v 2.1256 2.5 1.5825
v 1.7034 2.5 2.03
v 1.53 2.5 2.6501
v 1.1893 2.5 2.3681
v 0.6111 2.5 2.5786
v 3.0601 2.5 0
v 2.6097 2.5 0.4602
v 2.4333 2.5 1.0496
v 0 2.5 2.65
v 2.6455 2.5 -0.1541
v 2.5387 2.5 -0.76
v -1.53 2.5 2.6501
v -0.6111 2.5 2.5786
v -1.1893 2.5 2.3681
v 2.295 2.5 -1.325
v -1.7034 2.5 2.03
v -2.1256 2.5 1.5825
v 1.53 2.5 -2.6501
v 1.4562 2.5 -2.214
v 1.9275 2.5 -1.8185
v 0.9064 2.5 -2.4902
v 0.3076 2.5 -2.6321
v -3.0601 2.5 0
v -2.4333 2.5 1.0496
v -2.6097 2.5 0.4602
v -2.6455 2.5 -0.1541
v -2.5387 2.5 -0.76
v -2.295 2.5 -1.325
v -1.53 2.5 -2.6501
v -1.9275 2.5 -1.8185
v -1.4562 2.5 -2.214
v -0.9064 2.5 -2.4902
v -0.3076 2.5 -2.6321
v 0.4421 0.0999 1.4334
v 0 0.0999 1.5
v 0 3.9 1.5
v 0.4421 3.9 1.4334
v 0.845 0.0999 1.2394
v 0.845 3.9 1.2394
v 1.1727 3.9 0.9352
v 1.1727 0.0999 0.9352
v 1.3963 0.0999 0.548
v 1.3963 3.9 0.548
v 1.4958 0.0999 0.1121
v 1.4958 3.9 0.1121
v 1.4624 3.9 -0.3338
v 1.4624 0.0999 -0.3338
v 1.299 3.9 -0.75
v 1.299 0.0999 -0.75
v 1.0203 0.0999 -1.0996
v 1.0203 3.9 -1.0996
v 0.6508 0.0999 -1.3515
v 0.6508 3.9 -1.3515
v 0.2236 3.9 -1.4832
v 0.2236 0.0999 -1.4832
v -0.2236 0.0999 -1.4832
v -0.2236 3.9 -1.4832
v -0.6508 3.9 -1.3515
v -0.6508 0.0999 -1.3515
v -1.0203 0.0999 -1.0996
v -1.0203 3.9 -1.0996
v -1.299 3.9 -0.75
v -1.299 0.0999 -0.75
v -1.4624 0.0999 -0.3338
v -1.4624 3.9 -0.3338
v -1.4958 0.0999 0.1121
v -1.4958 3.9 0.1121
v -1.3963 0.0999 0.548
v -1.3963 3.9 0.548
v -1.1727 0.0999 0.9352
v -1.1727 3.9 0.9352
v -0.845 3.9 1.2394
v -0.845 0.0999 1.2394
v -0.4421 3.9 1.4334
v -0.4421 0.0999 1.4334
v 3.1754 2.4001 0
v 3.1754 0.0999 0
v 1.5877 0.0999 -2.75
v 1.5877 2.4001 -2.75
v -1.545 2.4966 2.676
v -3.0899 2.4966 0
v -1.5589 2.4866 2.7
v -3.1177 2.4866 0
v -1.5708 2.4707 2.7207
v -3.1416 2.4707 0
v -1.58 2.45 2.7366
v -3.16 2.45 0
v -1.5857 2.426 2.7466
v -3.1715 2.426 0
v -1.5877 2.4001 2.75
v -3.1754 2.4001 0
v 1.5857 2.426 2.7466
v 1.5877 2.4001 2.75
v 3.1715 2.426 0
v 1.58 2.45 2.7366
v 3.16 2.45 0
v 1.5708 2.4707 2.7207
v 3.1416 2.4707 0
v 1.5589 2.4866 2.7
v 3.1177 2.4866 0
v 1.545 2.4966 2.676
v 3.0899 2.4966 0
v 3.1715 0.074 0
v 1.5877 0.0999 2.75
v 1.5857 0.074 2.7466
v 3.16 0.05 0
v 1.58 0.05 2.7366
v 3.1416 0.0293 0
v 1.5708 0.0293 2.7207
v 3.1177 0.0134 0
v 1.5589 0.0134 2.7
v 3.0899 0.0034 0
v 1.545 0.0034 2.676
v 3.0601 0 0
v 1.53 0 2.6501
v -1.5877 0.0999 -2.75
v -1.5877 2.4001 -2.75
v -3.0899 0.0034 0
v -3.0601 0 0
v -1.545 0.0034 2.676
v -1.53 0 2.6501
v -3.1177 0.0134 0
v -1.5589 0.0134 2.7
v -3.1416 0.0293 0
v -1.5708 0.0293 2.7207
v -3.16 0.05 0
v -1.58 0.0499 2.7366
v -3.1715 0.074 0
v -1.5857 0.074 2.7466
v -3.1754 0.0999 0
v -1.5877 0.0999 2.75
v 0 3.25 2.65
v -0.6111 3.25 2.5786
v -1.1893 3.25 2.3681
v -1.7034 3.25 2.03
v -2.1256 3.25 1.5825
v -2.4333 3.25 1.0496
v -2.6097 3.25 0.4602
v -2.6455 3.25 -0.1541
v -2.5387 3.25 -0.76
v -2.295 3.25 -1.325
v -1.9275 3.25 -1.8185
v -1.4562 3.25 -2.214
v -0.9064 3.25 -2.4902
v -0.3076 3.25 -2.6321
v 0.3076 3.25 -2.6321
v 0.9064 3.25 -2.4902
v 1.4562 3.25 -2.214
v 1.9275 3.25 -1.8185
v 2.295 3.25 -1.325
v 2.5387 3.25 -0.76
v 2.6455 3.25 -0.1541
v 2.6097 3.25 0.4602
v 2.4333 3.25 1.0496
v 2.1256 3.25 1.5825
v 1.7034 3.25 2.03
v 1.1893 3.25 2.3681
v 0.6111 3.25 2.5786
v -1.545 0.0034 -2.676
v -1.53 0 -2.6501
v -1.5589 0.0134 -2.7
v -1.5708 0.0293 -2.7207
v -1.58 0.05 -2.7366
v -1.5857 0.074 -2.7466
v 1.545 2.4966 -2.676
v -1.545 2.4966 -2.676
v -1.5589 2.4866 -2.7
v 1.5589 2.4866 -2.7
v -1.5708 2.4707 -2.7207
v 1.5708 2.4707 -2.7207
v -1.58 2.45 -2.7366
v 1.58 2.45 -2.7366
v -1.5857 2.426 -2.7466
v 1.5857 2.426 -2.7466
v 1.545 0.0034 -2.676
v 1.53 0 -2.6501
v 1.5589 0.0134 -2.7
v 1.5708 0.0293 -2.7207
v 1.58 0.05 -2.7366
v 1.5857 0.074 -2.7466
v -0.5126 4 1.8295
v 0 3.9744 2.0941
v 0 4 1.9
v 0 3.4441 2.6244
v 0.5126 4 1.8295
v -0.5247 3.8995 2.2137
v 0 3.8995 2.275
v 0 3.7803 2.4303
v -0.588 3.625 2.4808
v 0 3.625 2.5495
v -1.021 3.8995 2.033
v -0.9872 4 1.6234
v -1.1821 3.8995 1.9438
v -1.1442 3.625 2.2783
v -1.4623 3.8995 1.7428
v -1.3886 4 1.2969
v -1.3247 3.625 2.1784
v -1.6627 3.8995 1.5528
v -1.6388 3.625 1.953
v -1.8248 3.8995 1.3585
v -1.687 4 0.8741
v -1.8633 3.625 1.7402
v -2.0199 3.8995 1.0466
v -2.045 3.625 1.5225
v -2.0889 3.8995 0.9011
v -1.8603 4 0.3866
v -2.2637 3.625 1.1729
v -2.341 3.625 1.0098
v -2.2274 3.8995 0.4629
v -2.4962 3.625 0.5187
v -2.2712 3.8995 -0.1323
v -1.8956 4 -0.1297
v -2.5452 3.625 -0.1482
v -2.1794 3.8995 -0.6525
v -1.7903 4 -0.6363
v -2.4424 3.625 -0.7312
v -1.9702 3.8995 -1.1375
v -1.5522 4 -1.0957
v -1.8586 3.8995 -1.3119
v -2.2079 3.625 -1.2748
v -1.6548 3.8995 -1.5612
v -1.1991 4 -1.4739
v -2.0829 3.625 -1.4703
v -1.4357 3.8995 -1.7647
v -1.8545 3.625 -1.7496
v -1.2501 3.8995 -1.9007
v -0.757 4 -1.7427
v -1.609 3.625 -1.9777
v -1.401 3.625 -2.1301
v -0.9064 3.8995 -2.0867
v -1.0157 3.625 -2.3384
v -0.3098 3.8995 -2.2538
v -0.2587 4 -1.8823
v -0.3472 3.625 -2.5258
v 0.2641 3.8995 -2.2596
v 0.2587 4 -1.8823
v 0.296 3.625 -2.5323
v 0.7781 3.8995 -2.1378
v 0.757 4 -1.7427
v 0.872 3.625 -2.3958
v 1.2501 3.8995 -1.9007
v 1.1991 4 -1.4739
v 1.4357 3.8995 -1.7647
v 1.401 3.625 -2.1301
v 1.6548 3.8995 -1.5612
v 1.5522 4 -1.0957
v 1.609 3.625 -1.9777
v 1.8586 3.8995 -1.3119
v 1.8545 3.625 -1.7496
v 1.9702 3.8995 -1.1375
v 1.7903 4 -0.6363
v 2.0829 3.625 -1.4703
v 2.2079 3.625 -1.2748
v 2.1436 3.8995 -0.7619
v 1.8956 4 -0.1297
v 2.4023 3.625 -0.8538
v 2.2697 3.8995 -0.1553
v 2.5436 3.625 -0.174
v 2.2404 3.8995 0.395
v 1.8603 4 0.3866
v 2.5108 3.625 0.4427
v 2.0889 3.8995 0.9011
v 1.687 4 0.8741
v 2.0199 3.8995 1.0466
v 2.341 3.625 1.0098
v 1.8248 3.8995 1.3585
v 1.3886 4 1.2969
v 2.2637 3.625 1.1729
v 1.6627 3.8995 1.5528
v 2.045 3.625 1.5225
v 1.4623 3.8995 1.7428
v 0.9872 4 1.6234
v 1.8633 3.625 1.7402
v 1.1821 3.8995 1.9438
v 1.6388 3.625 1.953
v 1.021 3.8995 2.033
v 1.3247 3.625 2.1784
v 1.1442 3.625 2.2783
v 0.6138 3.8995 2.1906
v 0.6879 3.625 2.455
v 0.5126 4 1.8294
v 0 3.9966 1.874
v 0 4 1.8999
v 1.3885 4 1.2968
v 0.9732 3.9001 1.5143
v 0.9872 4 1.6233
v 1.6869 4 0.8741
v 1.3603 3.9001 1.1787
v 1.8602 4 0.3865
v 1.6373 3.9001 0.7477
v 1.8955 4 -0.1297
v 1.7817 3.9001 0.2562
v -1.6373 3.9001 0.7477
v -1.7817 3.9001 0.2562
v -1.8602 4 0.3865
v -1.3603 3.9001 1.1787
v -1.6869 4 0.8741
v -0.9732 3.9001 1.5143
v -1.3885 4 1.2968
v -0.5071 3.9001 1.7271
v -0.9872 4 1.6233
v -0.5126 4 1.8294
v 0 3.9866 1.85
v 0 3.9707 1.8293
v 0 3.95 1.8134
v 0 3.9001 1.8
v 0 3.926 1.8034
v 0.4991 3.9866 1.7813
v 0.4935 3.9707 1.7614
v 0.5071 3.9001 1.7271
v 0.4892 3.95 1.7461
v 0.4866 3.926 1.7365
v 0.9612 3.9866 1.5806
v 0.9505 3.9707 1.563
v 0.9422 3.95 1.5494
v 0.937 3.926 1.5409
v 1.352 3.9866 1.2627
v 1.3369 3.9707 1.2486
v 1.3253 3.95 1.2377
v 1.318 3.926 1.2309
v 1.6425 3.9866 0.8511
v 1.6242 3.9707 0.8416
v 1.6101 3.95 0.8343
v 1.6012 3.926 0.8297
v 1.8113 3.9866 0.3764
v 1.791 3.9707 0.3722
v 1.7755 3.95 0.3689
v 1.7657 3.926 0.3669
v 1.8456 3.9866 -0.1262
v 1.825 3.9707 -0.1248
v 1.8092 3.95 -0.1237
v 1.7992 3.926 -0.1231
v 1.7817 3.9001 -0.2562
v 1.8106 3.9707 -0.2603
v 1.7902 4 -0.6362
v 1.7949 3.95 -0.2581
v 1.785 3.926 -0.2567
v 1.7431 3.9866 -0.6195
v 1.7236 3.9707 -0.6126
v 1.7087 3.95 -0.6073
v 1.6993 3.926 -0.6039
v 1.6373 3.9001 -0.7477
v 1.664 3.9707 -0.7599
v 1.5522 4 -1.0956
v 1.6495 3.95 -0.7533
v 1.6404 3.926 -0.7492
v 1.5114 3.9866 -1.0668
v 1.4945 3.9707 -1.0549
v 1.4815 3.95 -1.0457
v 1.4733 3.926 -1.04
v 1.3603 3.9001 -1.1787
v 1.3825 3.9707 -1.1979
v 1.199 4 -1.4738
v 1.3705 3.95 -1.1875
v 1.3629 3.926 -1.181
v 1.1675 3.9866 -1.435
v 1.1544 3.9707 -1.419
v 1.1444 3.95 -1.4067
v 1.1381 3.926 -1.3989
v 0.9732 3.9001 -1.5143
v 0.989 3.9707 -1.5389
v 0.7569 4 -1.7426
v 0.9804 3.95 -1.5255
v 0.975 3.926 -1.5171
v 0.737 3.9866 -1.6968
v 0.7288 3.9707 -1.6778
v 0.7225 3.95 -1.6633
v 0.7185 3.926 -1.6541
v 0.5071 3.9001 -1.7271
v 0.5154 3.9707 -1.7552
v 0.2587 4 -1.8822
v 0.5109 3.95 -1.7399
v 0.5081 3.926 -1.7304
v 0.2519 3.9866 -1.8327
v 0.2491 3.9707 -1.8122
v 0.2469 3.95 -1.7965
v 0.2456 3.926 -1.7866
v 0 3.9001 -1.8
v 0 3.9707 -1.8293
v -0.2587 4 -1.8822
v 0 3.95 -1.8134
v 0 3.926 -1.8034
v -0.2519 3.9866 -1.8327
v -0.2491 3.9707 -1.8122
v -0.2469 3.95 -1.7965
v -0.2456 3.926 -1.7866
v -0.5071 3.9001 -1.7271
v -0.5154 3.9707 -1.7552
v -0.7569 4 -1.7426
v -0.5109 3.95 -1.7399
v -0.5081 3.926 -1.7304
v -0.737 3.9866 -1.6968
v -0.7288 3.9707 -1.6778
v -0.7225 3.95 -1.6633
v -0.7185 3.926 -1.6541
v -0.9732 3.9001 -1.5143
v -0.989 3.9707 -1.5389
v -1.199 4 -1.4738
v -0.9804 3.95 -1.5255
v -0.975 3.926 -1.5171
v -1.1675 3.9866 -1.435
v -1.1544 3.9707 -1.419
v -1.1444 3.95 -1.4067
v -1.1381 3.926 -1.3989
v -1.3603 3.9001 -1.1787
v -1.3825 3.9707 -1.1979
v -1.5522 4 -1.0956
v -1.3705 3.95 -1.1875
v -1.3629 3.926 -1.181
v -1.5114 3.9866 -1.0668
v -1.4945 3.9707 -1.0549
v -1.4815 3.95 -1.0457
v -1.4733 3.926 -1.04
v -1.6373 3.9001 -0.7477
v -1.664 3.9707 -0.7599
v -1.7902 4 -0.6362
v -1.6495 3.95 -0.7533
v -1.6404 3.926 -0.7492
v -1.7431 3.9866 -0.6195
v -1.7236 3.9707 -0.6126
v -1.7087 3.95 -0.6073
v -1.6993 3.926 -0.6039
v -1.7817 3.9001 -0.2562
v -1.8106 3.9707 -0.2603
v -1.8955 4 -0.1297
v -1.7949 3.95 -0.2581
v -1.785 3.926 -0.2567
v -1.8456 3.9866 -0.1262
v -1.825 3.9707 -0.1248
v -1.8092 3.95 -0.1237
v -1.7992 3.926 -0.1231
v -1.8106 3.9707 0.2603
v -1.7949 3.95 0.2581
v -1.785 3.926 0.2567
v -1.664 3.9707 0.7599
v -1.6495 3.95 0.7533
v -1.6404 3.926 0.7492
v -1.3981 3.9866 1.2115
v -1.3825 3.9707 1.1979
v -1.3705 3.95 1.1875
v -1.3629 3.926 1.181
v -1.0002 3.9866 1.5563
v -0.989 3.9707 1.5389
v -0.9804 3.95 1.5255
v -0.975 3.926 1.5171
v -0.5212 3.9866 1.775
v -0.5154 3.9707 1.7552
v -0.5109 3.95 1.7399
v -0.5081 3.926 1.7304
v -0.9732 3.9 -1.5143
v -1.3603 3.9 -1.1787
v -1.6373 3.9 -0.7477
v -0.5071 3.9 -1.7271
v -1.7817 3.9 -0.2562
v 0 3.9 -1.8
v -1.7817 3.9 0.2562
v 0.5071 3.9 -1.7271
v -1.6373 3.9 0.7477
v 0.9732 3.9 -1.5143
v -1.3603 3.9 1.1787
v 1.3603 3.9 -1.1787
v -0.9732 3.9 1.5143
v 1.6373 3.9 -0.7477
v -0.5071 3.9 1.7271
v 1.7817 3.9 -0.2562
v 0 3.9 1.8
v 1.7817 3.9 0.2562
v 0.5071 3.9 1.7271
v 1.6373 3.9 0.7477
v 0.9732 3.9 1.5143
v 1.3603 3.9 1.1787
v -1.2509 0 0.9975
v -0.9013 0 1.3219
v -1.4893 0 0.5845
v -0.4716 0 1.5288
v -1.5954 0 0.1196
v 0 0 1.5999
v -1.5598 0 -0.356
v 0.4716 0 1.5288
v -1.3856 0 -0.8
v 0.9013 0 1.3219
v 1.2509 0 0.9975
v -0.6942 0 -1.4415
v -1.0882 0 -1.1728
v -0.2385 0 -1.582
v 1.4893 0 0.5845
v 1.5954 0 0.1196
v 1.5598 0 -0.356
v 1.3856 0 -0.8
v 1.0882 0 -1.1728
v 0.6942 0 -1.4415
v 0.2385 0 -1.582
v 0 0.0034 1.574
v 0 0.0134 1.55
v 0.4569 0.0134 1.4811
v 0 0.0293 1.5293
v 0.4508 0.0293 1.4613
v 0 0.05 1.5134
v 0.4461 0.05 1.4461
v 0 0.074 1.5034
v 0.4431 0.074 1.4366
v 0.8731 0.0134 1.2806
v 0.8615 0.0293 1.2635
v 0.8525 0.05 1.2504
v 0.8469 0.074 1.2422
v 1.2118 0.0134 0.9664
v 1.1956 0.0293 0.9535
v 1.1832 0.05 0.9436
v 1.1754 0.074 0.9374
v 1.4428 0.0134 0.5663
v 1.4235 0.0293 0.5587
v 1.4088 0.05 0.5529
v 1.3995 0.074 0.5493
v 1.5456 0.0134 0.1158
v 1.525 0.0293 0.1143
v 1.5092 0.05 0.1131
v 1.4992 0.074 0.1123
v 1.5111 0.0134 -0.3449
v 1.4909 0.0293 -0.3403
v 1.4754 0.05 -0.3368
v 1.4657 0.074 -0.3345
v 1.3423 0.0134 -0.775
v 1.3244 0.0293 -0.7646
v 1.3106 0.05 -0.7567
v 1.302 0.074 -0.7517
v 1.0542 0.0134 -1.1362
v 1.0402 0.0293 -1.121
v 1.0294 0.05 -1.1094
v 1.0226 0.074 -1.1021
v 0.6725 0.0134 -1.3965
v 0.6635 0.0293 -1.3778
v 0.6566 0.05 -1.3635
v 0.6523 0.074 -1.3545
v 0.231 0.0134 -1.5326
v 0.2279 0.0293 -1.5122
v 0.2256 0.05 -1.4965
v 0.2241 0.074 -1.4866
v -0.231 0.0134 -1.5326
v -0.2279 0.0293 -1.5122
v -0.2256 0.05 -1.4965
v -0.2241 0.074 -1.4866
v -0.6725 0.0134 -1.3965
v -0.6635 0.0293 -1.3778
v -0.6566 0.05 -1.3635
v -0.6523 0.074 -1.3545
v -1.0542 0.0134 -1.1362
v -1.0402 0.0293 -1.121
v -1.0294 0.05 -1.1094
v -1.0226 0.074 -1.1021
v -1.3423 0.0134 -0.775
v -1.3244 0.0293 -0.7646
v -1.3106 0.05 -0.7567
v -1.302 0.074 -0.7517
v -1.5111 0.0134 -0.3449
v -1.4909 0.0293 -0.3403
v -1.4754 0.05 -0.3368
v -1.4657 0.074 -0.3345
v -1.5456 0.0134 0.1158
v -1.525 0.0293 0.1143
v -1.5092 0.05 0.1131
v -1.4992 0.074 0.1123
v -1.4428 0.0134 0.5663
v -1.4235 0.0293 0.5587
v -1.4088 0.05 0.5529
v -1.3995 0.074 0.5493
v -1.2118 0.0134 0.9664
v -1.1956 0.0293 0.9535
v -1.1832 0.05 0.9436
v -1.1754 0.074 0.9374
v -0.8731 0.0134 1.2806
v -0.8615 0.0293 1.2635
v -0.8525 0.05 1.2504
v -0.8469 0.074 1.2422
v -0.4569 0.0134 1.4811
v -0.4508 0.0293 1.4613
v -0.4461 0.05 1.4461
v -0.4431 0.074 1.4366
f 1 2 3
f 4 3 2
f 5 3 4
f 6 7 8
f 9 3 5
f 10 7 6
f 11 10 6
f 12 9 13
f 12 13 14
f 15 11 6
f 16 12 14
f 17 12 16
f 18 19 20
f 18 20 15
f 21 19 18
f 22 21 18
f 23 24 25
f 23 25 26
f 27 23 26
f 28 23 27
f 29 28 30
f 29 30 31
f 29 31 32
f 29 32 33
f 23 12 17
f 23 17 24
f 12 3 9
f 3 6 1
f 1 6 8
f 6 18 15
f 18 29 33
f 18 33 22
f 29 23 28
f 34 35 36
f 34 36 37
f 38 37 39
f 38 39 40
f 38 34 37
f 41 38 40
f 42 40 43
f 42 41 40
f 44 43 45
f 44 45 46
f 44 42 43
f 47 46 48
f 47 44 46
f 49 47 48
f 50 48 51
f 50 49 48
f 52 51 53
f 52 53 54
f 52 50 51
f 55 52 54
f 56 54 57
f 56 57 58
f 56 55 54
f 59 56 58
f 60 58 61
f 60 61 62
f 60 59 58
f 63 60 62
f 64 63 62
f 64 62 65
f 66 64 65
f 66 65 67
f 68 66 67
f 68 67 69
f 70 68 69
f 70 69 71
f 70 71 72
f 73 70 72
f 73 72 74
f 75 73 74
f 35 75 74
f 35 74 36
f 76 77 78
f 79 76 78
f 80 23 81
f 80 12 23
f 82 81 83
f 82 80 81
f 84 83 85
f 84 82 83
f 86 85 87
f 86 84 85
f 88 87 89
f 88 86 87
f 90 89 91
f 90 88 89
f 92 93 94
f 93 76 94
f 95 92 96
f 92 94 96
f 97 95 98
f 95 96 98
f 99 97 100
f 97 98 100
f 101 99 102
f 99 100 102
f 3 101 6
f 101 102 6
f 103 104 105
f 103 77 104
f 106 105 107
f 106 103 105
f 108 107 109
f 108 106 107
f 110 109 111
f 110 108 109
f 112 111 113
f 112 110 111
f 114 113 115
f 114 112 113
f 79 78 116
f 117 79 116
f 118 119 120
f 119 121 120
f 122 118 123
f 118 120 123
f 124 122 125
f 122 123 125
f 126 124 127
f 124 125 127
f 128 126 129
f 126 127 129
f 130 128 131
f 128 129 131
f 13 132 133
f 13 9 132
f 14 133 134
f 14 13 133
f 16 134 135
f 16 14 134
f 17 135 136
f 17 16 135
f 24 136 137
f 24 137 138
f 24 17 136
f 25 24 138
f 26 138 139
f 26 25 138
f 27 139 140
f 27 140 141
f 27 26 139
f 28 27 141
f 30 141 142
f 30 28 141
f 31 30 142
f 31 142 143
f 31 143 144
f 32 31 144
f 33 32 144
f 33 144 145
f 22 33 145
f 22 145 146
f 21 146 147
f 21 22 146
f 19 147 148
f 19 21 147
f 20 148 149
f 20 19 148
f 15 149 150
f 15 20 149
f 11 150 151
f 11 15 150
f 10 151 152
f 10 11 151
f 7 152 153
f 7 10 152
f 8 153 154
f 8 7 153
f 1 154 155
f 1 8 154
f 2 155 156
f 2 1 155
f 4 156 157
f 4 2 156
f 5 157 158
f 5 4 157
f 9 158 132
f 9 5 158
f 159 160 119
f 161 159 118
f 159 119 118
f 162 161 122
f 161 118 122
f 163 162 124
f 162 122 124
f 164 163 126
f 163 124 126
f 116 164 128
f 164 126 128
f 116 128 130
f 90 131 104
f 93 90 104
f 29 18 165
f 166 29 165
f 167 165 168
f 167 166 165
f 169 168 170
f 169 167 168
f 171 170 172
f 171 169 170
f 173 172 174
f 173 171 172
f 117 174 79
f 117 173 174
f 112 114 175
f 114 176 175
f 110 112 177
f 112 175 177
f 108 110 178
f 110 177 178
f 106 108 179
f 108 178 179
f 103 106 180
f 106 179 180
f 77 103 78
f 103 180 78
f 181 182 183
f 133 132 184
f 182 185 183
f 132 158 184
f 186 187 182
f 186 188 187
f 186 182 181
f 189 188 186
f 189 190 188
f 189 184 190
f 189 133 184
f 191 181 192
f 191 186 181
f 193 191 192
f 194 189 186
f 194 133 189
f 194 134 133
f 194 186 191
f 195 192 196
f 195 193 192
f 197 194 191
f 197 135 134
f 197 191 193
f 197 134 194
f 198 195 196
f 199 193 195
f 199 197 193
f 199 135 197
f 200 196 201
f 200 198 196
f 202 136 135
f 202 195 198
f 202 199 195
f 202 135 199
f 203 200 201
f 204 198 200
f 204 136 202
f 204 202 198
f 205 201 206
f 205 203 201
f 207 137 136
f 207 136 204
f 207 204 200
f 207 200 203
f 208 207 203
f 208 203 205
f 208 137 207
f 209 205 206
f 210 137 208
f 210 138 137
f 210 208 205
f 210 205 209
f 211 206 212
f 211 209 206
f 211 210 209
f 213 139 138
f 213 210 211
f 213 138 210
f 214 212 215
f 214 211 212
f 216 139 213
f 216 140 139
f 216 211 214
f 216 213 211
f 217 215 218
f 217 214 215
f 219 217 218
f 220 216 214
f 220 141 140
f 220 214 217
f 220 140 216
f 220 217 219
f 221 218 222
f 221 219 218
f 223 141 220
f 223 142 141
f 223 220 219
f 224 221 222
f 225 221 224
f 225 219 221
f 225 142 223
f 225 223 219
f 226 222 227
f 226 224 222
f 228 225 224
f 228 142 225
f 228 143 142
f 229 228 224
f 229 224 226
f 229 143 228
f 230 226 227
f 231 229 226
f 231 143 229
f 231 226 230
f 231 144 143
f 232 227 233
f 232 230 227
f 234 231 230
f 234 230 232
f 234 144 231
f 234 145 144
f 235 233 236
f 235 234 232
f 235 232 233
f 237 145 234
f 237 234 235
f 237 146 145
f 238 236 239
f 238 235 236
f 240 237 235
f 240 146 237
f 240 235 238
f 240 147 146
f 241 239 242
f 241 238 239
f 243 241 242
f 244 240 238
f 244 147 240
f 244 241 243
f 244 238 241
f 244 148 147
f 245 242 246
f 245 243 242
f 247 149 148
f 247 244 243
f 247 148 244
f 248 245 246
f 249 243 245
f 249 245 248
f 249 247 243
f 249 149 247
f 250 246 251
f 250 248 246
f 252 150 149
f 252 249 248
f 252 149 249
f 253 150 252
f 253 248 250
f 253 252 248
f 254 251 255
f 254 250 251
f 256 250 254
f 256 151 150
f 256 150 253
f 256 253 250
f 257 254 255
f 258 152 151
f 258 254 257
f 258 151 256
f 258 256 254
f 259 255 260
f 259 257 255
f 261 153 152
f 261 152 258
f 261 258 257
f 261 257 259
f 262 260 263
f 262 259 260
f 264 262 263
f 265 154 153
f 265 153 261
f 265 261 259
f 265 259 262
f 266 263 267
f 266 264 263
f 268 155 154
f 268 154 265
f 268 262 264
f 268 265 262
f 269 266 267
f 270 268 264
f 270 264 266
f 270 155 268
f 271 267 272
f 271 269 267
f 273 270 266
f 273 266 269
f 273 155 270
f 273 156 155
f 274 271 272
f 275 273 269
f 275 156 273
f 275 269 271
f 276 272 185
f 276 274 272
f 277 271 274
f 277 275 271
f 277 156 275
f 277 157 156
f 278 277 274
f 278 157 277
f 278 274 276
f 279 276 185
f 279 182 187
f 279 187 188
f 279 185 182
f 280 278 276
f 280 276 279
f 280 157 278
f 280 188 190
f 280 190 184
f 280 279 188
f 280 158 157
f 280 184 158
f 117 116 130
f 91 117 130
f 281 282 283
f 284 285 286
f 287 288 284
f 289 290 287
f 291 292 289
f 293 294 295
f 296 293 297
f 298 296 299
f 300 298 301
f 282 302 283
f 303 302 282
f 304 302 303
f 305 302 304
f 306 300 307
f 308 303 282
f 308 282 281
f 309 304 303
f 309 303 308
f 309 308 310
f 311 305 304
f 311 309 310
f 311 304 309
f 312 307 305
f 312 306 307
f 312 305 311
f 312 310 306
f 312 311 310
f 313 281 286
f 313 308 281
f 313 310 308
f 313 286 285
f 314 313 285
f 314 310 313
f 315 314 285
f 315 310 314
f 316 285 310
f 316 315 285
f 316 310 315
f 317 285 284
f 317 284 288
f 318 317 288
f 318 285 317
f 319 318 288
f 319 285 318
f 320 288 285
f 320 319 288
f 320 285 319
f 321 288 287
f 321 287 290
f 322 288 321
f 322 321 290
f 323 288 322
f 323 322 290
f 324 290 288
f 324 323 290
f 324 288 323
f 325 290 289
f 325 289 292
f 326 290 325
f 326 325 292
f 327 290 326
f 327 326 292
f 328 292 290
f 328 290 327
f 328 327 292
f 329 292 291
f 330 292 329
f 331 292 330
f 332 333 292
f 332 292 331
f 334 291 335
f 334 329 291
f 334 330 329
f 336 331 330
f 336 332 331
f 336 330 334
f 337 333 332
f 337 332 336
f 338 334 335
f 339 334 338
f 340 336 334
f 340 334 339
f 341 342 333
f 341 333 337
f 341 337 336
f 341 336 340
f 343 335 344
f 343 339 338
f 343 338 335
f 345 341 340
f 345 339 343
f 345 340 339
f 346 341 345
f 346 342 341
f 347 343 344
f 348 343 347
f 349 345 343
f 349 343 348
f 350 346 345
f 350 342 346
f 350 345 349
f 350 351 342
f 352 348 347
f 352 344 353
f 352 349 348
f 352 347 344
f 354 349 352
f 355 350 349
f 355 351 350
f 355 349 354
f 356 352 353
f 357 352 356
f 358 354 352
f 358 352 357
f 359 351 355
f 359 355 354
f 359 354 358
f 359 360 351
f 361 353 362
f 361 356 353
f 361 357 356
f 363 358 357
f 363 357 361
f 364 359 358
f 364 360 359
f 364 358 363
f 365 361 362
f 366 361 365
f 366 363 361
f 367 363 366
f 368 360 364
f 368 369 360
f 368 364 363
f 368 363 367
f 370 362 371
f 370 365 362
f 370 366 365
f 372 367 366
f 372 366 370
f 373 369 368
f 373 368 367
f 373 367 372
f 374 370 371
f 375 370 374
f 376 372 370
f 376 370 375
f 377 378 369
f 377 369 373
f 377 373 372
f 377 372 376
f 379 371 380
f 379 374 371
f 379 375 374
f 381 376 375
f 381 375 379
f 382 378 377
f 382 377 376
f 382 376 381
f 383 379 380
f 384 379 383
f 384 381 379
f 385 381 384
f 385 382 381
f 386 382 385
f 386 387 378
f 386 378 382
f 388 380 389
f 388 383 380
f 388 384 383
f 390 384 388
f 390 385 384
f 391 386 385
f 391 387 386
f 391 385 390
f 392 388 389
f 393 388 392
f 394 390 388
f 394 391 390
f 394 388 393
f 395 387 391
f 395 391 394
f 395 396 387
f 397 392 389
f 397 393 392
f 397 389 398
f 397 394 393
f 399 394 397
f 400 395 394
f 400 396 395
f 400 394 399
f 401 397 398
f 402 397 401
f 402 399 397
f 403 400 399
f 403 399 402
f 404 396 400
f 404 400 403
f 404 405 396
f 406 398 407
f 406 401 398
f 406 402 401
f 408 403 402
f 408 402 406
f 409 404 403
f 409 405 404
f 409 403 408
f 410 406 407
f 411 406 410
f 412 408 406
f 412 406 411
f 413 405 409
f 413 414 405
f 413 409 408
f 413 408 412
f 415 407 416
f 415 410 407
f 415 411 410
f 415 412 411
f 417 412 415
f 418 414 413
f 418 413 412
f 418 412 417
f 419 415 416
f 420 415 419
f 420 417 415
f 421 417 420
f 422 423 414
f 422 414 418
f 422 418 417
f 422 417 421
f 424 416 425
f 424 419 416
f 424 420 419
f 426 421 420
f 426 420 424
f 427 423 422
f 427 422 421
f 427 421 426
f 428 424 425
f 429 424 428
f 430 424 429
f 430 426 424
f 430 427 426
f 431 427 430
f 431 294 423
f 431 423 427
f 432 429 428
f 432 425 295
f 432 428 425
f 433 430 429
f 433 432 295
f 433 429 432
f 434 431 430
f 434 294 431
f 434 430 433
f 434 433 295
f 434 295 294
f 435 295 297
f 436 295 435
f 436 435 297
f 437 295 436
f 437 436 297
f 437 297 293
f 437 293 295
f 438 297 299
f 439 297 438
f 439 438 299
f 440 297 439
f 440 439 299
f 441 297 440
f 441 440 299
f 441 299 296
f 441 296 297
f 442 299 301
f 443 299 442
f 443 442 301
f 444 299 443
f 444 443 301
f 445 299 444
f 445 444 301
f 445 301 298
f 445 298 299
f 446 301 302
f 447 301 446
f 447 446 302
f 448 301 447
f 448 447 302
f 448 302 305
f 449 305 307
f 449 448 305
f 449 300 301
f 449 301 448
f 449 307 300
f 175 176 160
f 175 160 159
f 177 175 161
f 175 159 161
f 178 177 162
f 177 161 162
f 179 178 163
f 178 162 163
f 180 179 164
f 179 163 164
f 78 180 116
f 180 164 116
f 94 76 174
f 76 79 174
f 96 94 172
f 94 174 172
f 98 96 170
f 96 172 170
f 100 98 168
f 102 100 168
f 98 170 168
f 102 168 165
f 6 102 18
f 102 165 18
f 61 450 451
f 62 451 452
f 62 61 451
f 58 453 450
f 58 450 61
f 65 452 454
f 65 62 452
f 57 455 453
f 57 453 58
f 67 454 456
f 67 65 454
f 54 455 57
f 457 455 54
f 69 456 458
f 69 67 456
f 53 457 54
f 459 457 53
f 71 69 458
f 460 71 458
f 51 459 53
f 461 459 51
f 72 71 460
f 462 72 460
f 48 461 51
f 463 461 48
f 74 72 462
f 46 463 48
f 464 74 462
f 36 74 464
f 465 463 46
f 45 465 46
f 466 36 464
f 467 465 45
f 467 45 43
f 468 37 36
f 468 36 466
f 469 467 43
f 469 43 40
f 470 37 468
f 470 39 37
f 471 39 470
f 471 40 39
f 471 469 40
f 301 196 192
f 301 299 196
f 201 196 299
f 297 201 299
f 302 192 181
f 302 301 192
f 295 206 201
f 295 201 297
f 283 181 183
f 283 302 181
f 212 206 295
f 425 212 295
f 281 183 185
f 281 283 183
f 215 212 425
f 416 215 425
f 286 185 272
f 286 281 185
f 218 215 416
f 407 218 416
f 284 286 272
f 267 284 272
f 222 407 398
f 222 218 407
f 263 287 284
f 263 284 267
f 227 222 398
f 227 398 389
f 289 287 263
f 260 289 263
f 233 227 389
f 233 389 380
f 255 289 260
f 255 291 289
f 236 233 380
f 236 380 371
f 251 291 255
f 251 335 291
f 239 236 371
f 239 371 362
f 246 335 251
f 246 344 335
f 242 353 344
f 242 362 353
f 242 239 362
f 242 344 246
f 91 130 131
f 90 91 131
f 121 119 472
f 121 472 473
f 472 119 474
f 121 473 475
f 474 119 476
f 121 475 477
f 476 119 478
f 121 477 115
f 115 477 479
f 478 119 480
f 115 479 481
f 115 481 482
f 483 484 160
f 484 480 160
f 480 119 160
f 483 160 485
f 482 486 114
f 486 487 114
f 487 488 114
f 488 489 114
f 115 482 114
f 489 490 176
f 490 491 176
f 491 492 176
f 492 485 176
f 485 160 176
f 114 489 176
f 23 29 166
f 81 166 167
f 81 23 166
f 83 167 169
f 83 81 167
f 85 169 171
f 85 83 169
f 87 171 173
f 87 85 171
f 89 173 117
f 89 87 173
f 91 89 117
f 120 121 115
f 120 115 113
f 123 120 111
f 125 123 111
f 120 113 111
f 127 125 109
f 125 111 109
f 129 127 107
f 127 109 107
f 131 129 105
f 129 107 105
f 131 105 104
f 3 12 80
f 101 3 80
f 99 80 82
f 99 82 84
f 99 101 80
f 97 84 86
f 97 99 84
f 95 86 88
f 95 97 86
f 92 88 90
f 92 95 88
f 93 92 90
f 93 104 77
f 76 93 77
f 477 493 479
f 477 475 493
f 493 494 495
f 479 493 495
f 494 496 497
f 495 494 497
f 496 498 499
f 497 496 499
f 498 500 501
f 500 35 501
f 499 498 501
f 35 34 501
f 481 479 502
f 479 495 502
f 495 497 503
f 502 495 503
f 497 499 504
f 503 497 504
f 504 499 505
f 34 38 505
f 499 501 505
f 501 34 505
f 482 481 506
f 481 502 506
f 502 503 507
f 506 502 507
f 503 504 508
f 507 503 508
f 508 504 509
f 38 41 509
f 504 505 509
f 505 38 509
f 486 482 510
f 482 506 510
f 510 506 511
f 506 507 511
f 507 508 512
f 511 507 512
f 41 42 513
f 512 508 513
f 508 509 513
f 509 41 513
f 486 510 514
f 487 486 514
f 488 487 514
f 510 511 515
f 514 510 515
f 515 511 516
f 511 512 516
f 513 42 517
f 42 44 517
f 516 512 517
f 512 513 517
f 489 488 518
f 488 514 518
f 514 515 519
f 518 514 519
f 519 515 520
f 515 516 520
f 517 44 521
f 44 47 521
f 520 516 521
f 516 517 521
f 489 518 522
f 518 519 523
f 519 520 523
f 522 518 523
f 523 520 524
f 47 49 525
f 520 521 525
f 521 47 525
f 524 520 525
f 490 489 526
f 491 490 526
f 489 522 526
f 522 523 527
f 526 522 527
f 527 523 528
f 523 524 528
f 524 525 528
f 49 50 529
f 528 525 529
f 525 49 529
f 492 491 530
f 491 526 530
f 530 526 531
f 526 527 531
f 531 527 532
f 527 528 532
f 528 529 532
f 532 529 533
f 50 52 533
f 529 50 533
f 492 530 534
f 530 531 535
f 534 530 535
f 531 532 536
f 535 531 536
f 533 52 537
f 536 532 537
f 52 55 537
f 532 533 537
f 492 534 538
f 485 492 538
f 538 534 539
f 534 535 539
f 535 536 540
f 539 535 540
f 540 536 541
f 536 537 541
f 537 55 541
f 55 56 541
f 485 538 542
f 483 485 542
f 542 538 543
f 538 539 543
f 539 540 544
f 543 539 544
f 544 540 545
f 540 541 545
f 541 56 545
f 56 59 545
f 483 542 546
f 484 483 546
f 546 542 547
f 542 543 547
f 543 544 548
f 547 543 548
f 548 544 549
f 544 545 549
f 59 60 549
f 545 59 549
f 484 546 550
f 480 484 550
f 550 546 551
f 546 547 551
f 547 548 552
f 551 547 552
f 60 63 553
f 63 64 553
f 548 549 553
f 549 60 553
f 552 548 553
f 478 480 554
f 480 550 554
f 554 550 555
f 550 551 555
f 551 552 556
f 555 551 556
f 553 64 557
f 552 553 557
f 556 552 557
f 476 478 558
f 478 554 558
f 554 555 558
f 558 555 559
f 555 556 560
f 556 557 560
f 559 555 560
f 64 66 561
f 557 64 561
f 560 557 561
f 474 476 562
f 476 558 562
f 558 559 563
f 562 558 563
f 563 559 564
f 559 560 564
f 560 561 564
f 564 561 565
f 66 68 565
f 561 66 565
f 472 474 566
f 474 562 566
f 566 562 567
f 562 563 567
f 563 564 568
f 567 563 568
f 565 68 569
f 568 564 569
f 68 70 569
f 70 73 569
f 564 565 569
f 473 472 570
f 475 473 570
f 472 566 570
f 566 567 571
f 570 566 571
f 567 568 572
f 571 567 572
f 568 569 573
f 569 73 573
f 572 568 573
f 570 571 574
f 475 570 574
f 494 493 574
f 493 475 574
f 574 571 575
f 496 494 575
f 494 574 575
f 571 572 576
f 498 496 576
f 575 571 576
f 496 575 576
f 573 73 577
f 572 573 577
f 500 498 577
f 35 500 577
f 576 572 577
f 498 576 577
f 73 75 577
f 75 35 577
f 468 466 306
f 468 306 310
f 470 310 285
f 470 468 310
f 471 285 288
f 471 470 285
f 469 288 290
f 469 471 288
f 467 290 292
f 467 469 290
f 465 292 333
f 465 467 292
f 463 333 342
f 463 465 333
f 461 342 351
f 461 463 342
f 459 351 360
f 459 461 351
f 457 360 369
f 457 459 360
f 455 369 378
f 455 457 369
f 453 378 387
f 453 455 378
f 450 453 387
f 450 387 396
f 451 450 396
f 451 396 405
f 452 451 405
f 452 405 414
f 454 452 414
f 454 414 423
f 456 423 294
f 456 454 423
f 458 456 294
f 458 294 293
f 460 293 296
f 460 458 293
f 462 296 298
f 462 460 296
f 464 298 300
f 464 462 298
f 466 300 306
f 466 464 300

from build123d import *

# Parameters (mm, degrees)
SKETCH1_R           = 1.5
BOSS_EXTRUDE1_DEPTH = 4
FILLET1_R           = 0.1
CUT_EXTRUDE1_START  = -0.1
SKETCH3_R           = 1.8
SKETCH3_R_2         = 1.5
CUT_EXTRUDE1_DEPTH  = 0.1
FILLET2_R           = 0.1


with BuildPart() as part:
    # Sketch1 → Boss-Extrude1 (new body)
    with BuildSketch(Plane(origin=(0, 0, 0), x_dir=(1, 0, 0), z_dir=(0, 1, 0))):
        Polygon((1.58771324, -2.75), (3.175426481, 0), (1.58771324, 2.75), (-1.58771324, 2.75), (-3.175426481, 0), (-1.58771324, -2.75), align=None)
        with Locations(Location((0, 0, 0), (0, 0, 270))):
            Circle(SKETCH1_R, mode=Mode.SUBTRACT)
    extrude(amount=BOSS_EXTRUDE1_DEPTH)

    # Sketch2 → Cut-Revolve3 (revolve, cut)
    with BuildSketch(Plane(origin=(0, 0, 0), x_dir=(0, 0, -1), z_dir=(1, 0, 0))):
        with BuildLine():
            Line((-2.65, 3.25), (-2.65, 2.5))
            Line((-2.65, 2.5), (-5.25, 2.5))
            Line((-5.25, 2.5), (-5.25, 4))
            Line((-5.25, 4), (-5.25, 4.1))
            Line((-5.25, 4.1), (-1.9, 4.1))
            Line((-1.9, 4.1), (-1.9, 4))
            ThreePointArc((-1.9, 4), (-2.430330086, 3.780330086), (-2.65, 3.25))
        make_face()
    revolve(axis=Axis((0, 4, 0), (0, -1, 0)), mode=Mode.SUBTRACT)

    # Fillet1
    fillet1_edges = [part.edges().sort_by_distance(p)[0] for p in [
        (0, 0, -1.5),
        (-2.38156986, 2.5, 1.375),
        (2.38156986, 2.5, 1.375),
        (0, 2.5, 2.75),
        (-2.38156986, 2.5, -1.375),
        (0, 2.5, -2.75),
        (2.38156986, 2.5, -1.375),
        (-2.38156986, 0, 1.375),
        (-2.38156986, 0, -1.375),
        (0, 0, -2.75),
        (2.38156986, 0, -1.375),
        (2.38156986, 0, 1.375),
        (0, 0, 2.75),
    ]]
    fillet(fillet1_edges, radius=FILLET1_R - 0.0001)  # a hair under: the kernel refuses the full size

    # Sketch3 → Cut-Extrude1 (cut)
    with BuildSketch(Plane(origin=(0, 4, 0), x_dir=(1, 0, 0), z_dir=(0, 1, 0)).offset(CUT_EXTRUDE1_START)):
        with Locations(Location((0, 0, 0), (0, 0, 270))):
            Circle(SKETCH3_R)
        with Locations(Location((0, 0, 0), (0, 0, 270))):
            Circle(SKETCH3_R_2, mode=Mode.SUBTRACT)
    extrude(amount=CUT_EXTRUDE1_DEPTH, mode=Mode.SUBTRACT)

    # Fillet2
    fillet2_edges = [part.edges().sort_by_distance(p)[0] for p in [
        (0, 4, -1.8),
    ]]
    fillet(fillet2_edges, radius=FILLET2_R - 0.0001)  # a hair under: the kernel refuses the full size


solid = part.part
